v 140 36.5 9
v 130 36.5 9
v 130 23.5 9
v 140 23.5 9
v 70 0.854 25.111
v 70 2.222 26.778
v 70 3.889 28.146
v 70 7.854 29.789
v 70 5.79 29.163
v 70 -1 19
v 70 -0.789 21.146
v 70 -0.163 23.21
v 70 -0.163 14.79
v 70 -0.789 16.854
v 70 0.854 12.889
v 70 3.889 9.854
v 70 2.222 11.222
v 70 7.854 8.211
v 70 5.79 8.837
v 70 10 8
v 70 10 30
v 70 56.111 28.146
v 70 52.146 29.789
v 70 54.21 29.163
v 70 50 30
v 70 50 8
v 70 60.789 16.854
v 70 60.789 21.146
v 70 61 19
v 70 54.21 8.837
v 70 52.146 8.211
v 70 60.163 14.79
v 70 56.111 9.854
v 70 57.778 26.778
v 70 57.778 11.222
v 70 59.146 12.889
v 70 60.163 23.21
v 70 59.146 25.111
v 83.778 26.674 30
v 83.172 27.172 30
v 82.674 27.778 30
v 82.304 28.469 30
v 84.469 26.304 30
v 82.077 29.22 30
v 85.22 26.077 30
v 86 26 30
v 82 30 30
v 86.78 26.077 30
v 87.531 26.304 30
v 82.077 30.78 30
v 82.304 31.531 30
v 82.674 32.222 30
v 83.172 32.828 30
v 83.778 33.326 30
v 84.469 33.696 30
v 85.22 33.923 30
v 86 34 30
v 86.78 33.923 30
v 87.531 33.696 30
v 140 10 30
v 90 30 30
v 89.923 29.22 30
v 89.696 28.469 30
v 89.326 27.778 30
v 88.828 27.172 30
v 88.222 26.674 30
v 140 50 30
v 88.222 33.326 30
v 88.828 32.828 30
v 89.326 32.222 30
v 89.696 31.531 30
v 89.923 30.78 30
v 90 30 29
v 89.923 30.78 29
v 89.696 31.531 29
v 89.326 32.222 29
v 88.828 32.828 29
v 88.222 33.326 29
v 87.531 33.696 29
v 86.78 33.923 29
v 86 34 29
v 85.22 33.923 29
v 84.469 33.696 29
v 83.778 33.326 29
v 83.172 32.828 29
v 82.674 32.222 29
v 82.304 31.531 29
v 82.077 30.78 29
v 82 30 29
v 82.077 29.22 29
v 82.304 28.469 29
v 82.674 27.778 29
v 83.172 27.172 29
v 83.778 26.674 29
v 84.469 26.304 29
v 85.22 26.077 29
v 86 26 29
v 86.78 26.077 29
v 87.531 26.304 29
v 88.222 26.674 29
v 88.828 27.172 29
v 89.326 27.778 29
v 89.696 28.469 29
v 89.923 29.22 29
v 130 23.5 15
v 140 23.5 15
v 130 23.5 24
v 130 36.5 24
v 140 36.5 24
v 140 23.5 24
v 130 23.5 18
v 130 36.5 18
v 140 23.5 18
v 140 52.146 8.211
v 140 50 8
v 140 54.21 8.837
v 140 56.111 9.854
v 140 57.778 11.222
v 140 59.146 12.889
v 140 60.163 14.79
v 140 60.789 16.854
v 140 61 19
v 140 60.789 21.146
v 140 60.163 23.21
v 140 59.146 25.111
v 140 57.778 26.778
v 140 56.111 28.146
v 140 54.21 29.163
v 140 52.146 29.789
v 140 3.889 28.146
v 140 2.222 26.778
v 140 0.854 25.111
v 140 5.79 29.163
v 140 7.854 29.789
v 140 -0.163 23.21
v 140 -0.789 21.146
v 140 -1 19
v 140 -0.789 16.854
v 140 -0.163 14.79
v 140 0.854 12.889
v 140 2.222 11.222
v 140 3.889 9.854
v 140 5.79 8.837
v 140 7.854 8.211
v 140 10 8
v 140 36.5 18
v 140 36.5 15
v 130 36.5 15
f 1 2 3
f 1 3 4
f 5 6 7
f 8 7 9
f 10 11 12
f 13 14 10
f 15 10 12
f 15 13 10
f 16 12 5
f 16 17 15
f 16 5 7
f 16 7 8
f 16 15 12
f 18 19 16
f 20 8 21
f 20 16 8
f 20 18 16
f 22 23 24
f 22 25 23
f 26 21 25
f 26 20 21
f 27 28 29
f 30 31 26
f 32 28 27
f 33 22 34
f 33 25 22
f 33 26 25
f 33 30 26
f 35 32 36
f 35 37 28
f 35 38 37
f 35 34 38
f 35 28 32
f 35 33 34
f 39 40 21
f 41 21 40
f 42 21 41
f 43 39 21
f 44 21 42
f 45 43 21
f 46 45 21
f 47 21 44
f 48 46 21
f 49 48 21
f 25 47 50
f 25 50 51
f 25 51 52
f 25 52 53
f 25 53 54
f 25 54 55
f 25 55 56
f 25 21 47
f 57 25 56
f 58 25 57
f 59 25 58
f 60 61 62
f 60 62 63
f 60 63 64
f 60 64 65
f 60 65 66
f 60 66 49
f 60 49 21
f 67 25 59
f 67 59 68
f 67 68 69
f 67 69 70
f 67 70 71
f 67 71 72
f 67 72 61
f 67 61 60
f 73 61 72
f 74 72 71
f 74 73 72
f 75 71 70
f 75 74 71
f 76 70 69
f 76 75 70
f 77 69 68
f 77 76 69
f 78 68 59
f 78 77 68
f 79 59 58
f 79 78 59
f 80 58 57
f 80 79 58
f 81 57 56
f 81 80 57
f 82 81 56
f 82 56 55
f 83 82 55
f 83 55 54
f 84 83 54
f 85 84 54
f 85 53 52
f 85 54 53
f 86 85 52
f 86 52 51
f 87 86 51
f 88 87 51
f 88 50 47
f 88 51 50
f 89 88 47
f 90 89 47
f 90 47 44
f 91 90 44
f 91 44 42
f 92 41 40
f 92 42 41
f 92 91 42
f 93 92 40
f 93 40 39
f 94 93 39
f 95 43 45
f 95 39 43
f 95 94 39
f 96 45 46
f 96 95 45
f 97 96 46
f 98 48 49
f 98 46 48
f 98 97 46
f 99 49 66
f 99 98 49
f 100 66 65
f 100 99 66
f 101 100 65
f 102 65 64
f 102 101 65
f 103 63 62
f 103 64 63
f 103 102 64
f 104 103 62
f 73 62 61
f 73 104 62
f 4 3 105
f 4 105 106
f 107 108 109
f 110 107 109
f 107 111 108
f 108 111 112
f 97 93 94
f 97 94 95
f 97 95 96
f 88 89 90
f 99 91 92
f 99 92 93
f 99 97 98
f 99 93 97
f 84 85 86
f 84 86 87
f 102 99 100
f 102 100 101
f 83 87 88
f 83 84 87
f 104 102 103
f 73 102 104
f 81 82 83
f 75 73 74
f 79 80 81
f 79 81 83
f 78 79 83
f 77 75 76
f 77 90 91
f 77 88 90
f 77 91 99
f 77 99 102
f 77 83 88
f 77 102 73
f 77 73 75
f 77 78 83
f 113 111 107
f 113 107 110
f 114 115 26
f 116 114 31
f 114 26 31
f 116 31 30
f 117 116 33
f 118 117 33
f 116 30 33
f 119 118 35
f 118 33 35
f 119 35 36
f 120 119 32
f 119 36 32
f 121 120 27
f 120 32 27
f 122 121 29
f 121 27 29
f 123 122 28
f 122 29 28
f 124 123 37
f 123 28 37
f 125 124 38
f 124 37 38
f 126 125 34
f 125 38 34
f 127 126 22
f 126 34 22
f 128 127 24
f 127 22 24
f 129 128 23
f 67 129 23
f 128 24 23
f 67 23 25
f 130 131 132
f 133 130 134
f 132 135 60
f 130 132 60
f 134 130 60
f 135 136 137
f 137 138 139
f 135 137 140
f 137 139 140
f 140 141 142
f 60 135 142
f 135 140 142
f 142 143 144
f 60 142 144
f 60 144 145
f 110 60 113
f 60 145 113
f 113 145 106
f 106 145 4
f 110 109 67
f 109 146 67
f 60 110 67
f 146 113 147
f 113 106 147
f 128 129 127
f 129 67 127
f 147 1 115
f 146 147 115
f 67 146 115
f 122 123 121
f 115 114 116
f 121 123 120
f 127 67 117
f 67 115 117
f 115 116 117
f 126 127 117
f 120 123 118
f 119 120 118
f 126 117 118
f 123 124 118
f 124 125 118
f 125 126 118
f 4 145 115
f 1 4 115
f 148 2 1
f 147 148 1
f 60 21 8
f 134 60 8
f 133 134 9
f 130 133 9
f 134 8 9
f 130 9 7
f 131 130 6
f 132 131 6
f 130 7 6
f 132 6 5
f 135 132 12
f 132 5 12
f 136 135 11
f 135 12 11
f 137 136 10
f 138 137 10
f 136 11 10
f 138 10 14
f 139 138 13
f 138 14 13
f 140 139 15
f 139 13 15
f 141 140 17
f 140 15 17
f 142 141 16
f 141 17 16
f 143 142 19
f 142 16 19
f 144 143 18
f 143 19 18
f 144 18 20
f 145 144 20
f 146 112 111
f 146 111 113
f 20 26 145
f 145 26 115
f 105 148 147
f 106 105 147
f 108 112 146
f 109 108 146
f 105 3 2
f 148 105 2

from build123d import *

# Parameters (mm, degrees)
CYLINDER002001001002003_R           = 4
CYLINDER002001001002003_DEPTH       = 2
BOX001002001003003_W                = 15
BOX001002001003003_H                = 13
BOX001002001003003_DEPTH            = 6
BOX001001001_W                      = 15
BOX001001001_H                      = 13
BOX001001001_DEPTH                  = 6
BOX001002001003002_W                = 70
BOX001002001003002_H                = 40
BOX001002001003002_DEPTH            = 22
CYLINDER002001001002002_R           = 11
CYLINDER002001001002002_DEPTH       = 70
CYLINDER002001001002002_PITCH_ANGLE = 90
CYLINDER001_R                       = 11
CYLINDER001_DEPTH                   = 70
CYLINDER001_PITCH_ANGLE             = 90


with BuildPart() as powerbutton:
    # Cylinder002001001002003 → Cylinder002001001002003 (new body)
    with BuildSketch(Plane(origin=(16, 20, 10), x_dir=(1, 0, 0), z_dir=(0, 0, 1))):
        Circle(CYLINDER002001001002003_R)
    extrude(amount=CYLINDER002001001002003_DEPTH)


with BuildPart() as usb1:
    # Box001002001003003 → Box001002001003003 (new body)
    with BuildSketch(Plane(origin=(60, 13.5, -1), x_dir=(1, 0, 0), z_dir=(0, 0, 1))):
        with Locations((7.5, 6.5)):
            Rectangle(BOX001002001003003_W, BOX001002001003003_H)
    extrude(amount=BOX001002001003003_DEPTH)


with BuildPart() as fusion001001:
    # Box001001001 → Box001001001 (new body)
    with BuildSketch(Plane(origin=(60, 13.5, -10), x_dir=(1, 0, 0), z_dir=(0, 0, 1))):
        with Locations((7.5, 6.5)):
            Rectangle(BOX001001001_W, BOX001001001_H)
    extrude(amount=BOX001001001_DEPTH)

    # Fusion001001: union PowerButton, USB1
    add(powerbutton.part)
    add(usb1.part)


with BuildPart() as box001002001003002:
    # Box001002001003002 → Box001002001003002 (new body)
    with BuildSketch(Plane.XY.offset(-11)):
        with Locations((35, 20)):
            Rectangle(BOX001002001003002_W, BOX001002001003002_H)
    extrude(amount=BOX001002001003002_DEPTH)


with BuildPart() as cylinder002001001002002:
    # Cylinder002001001002002 → Cylinder002001001002002 (new body)
    with BuildSketch(Plane.XY):
        Circle(CYLINDER002001001002002_R)
    extrude(amount=CYLINDER002001001002002_DEPTH)


with BuildPart() as cylinder002001001002002_1:
    # Cylinder002001001002002 pitch: moved
    add(cylinder002001001002002.part.rotate(Axis((0, 0, 0), (0, 1, 0)), CYLINDER002001001002002_PITCH_ANGLE))


with BuildPart() as cylinder002001001002002_2:
    # Cylinder002001001002002 placement: moved
    add(cylinder002001001002002_1.part)


with BuildPart() as eneloop:
    # Cylinder001 → Cylinder001 (new body)
    with BuildSketch(Plane.XY):
        Circle(CYLINDER001_R)
    extrude(amount=CYLINDER001_DEPTH)


with BuildPart() as eneloop_1:
    # Cylinder001 pitch: moved
    add(eneloop.part.rotate(Axis((0, 0, 0), (0, 1, 0)), CYLINDER001_PITCH_ANGLE))


with BuildPart() as eneloop_2:
    # Cylinder001 placement: moved
    add(eneloop_1.part.moved(Location((0, 40, 0))))

    # Fusion002001002002002001002: union Box001002001003002, Cylinder002001001002002
    add(box001002001003002.part)
    add(cylinder002001001002002_2.part)

    # Cut: cut Fusion001001
    add(fusion001001.part, mode=Mode.SUBTRACT)


with BuildPart() as eneloop_3:
    # Cut placement: moved
    add(eneloop_2.part.moved(Location((70, 10, 19))))


solid = eneloop_3.part
